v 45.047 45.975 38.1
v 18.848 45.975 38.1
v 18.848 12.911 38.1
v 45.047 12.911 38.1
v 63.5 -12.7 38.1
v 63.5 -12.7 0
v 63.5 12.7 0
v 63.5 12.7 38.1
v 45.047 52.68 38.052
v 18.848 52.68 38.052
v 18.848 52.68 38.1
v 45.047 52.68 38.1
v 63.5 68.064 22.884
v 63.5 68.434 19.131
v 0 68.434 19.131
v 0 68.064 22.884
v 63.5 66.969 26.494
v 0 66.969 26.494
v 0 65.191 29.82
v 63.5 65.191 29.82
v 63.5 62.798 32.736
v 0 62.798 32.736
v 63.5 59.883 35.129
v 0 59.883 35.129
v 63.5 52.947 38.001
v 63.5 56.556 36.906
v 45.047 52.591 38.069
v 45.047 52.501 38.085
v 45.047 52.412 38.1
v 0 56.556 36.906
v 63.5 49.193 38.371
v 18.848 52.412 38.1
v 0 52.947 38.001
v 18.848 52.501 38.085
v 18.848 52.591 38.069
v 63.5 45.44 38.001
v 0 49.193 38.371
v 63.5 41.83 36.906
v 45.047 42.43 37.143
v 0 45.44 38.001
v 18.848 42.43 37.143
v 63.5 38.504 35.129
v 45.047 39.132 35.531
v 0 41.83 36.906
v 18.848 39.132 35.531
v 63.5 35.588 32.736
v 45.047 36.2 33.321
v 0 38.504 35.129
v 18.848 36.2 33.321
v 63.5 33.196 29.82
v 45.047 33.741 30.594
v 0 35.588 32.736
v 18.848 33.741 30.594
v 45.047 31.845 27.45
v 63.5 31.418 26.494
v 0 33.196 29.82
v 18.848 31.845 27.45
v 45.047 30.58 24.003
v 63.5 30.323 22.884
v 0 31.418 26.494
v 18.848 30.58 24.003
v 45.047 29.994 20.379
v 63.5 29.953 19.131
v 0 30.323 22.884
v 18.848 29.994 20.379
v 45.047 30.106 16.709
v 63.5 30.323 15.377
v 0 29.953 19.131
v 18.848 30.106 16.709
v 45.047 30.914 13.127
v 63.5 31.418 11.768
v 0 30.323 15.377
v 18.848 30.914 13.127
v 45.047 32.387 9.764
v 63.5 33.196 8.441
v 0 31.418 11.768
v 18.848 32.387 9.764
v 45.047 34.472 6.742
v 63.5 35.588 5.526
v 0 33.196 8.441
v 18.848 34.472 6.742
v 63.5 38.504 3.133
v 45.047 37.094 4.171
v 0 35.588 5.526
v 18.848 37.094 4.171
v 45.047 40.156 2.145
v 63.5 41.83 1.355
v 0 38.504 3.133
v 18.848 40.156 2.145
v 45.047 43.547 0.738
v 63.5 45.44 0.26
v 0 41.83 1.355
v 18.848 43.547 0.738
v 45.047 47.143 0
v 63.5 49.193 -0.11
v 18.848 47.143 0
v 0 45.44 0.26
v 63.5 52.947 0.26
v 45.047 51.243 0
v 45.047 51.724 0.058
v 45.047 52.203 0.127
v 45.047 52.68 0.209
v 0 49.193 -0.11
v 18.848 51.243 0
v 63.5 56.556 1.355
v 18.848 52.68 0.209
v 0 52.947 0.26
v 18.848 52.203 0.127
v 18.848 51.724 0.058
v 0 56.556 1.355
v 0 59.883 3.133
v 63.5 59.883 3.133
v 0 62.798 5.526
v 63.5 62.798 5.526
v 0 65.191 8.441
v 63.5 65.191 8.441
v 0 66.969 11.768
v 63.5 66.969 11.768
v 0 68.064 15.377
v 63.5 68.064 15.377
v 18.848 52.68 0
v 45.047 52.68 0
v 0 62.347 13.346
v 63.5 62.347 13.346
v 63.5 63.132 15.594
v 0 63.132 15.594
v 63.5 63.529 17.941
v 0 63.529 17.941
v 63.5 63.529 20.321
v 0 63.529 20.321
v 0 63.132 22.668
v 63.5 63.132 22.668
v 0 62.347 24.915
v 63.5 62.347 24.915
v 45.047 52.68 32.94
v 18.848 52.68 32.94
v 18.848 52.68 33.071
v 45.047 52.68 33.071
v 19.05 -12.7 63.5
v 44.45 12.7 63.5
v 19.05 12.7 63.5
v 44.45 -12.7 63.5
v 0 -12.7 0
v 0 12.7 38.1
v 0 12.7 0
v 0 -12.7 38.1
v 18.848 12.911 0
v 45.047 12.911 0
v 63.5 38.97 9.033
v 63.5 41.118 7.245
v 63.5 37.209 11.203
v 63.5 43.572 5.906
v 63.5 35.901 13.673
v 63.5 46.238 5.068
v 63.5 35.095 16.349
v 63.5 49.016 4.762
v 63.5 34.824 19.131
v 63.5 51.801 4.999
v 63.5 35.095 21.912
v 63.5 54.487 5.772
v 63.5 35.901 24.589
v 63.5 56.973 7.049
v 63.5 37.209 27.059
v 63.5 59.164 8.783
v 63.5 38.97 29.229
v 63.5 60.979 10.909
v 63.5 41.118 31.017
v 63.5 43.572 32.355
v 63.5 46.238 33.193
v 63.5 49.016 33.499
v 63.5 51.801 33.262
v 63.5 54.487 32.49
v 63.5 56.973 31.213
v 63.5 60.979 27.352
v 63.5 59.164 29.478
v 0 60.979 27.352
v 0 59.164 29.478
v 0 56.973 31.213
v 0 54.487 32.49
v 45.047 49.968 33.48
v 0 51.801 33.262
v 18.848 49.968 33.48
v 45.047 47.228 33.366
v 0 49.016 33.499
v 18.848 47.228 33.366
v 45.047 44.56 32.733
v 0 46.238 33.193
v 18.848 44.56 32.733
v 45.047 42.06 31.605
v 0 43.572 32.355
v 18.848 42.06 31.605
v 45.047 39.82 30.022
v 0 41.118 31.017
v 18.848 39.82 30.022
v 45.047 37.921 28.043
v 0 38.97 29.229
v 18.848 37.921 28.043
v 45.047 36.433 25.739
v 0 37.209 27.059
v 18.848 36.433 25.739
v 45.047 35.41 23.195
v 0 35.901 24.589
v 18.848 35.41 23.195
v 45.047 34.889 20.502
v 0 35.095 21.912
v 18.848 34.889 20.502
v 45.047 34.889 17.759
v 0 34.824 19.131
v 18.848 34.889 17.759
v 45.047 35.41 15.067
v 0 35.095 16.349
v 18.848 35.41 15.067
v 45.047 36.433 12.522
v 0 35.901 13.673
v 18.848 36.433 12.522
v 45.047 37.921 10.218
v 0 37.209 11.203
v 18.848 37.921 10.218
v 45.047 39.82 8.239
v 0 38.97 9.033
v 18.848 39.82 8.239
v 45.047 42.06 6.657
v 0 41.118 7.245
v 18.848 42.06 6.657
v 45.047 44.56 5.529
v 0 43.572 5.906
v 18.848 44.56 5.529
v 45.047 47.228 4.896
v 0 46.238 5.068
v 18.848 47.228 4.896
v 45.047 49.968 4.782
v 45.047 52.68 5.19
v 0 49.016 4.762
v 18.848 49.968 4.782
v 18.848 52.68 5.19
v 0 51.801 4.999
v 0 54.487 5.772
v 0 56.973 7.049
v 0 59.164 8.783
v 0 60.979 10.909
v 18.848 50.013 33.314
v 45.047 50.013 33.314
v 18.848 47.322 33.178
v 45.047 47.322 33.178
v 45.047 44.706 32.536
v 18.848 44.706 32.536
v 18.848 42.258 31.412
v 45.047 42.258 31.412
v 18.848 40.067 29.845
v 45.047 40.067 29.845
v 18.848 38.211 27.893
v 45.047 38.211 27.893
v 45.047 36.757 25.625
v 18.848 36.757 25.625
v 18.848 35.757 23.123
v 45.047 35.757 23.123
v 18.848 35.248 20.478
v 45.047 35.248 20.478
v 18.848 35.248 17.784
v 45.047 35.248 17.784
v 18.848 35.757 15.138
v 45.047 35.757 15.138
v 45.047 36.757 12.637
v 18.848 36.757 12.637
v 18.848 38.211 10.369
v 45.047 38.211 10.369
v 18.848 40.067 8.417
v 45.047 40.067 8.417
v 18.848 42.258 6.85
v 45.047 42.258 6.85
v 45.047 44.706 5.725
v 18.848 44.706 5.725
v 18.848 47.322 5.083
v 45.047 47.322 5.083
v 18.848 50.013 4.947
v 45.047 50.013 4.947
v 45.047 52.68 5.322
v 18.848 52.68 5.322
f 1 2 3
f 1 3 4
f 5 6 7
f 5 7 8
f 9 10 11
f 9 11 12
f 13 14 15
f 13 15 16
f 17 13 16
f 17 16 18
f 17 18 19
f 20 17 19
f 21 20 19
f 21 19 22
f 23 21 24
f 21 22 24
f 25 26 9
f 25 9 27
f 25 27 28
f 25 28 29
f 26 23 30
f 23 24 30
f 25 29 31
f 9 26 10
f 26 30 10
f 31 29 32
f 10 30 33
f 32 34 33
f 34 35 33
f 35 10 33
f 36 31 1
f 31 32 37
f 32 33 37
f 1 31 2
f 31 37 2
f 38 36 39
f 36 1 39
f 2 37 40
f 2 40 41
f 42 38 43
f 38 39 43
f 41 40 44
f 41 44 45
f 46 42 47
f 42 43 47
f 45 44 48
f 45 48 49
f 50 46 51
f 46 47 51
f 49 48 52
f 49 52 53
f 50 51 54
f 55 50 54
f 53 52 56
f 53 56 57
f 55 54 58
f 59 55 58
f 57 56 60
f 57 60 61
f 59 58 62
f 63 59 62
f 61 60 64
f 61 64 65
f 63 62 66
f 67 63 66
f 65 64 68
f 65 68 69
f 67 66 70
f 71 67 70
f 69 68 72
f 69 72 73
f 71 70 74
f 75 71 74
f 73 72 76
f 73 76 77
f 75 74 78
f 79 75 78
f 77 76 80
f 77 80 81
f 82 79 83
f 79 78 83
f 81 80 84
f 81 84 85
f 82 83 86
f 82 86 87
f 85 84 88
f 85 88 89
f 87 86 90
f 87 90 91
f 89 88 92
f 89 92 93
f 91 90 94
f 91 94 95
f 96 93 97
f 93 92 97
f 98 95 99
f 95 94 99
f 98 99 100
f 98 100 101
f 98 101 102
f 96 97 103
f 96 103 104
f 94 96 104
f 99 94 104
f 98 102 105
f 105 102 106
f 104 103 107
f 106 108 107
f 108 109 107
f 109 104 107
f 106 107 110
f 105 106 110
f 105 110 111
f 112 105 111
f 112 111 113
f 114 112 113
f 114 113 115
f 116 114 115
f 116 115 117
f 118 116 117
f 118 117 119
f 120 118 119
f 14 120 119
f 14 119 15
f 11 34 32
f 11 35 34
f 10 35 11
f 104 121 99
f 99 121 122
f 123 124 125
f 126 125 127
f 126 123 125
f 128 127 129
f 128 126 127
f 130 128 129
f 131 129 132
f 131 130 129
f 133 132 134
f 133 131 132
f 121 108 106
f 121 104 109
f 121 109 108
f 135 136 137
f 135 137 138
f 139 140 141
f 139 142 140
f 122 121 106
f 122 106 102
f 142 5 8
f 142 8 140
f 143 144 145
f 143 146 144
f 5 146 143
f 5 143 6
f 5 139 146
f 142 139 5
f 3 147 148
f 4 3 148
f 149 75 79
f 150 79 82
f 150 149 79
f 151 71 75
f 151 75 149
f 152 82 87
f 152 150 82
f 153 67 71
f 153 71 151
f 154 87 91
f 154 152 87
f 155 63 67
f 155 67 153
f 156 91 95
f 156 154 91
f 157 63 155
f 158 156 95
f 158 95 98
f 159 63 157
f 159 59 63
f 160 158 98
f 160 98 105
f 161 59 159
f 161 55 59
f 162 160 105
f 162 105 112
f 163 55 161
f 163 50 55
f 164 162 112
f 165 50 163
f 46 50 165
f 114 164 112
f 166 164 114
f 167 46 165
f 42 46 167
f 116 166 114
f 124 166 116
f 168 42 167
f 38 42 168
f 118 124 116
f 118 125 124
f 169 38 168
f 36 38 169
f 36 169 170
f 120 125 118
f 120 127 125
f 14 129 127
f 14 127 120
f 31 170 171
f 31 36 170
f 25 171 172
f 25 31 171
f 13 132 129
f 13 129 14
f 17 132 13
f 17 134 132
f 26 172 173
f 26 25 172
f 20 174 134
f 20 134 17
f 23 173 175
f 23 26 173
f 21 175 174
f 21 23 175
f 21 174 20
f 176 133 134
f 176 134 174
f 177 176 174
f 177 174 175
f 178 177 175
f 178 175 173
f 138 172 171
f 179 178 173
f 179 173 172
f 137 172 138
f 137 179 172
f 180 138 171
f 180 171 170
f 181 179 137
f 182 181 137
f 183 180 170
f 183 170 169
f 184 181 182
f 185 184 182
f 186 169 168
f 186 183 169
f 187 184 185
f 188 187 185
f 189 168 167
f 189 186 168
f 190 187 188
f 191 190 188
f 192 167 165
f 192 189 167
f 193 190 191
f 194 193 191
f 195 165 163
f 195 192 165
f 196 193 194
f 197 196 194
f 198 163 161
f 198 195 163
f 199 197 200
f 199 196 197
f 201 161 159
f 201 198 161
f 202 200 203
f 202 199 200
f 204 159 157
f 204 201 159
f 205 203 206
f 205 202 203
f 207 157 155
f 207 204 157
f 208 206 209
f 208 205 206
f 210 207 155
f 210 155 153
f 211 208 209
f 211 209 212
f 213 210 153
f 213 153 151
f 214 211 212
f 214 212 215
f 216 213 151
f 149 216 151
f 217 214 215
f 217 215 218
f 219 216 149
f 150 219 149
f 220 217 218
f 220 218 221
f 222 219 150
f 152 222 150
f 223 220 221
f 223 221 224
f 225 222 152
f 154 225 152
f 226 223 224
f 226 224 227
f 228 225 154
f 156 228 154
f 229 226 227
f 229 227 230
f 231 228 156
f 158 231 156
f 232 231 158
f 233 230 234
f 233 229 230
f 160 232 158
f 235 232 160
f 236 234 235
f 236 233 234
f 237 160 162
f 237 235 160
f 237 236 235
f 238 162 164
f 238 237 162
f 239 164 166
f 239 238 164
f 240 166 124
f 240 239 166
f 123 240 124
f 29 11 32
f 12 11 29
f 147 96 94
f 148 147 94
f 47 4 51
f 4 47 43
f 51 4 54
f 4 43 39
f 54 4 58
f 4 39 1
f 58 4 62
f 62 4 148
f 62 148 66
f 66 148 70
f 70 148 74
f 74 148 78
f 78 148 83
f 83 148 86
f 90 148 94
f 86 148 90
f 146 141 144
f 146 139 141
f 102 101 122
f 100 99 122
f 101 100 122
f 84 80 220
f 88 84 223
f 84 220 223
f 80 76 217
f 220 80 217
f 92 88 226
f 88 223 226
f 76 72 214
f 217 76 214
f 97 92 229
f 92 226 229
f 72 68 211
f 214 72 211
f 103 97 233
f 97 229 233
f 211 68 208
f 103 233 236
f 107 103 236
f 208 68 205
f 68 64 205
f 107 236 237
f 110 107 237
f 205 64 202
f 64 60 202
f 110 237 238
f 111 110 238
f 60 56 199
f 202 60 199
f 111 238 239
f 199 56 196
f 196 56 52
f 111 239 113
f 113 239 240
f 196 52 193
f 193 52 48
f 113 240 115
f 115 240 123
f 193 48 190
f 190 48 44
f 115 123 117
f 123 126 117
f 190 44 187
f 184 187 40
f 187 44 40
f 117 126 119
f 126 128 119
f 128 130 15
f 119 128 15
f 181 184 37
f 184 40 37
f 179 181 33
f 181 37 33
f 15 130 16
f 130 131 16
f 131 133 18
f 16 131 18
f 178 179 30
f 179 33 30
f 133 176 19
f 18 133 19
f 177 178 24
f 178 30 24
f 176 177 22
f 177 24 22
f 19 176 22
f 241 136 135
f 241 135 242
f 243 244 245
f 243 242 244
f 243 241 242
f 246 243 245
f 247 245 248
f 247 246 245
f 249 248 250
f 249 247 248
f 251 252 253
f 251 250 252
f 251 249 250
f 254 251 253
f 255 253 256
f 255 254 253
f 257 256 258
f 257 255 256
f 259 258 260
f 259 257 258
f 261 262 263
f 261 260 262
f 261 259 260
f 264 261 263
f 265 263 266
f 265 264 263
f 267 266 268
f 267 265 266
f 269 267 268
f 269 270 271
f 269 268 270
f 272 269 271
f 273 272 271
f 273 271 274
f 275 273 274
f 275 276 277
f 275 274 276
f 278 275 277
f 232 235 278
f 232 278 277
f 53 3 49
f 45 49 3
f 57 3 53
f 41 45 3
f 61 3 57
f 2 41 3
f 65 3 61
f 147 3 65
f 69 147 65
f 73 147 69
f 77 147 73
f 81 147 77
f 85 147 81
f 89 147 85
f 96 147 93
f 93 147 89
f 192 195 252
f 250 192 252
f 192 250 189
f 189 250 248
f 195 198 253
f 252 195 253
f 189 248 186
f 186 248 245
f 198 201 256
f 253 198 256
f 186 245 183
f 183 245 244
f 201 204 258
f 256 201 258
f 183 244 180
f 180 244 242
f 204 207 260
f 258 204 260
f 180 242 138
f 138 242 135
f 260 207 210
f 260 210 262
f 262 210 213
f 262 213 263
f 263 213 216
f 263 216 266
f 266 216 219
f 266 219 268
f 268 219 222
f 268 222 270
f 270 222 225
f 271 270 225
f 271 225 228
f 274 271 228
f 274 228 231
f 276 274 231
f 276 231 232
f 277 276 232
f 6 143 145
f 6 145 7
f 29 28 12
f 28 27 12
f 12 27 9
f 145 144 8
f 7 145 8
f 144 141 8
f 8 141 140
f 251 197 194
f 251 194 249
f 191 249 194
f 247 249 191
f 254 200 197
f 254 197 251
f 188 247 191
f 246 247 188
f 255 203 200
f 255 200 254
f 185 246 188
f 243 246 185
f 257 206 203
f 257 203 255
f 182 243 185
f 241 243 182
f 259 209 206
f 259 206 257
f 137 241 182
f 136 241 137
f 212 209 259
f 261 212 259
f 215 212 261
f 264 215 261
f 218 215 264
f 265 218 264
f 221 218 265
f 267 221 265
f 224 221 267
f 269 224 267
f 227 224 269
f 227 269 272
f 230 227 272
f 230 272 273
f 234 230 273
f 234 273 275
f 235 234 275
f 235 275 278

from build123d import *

# Parameters (mm, degrees)
F2_DEPTH = 12.7
F1_R     = 19.240302
F1_R_2   = 14.369807
F3_DEPTH = 63.5
F4_W     = 26.198801
F4_H     = 39.769402
F5_DEPTH = 38.1
F6_R     = 14.197479
F7_DEPTH = 63.501


with BuildPart() as f2:
    # F0 (on Front) → F2 (new body, symmetric)
    with BuildSketch(Plane.XZ):
        Polygon((0, 38.1), (0, 0), (63.5, 0), (63.5, 38.1), (44.45, 63.5), (19.05, 63.5), align=None)
    extrude(amount=F2_DEPTH, both=True)


with BuildPart() as f3:
    # F1 (on Right) → F3 (new body)
    with BuildSketch(Plane.YZ):
        with Locations((49.193431, 19.130778)):
            Circle(F1_R)
        with Locations((49.193431, 19.130778)):
            Circle(F1_R_2, mode=Mode.SUBTRACT)
    extrude(amount=F3_DEPTH)

    # F4 (on Top) → F5 (join)
    with BuildSketch(Plane.XY):
        with Locations((31.947454, 32.79562)):
            Rectangle(F4_W, F4_H)
    extrude(amount=F5_DEPTH)

    # F6 (on Right) → F7 (cut, through all)
    with BuildSketch(Plane.YZ):
        with Locations((49.381908, 19.130778)):
            Circle(F6_R)
    extrude(amount=F7_DEPTH, mode=Mode.SUBTRACT)


solid = Compound([f2.part, f3.part])
